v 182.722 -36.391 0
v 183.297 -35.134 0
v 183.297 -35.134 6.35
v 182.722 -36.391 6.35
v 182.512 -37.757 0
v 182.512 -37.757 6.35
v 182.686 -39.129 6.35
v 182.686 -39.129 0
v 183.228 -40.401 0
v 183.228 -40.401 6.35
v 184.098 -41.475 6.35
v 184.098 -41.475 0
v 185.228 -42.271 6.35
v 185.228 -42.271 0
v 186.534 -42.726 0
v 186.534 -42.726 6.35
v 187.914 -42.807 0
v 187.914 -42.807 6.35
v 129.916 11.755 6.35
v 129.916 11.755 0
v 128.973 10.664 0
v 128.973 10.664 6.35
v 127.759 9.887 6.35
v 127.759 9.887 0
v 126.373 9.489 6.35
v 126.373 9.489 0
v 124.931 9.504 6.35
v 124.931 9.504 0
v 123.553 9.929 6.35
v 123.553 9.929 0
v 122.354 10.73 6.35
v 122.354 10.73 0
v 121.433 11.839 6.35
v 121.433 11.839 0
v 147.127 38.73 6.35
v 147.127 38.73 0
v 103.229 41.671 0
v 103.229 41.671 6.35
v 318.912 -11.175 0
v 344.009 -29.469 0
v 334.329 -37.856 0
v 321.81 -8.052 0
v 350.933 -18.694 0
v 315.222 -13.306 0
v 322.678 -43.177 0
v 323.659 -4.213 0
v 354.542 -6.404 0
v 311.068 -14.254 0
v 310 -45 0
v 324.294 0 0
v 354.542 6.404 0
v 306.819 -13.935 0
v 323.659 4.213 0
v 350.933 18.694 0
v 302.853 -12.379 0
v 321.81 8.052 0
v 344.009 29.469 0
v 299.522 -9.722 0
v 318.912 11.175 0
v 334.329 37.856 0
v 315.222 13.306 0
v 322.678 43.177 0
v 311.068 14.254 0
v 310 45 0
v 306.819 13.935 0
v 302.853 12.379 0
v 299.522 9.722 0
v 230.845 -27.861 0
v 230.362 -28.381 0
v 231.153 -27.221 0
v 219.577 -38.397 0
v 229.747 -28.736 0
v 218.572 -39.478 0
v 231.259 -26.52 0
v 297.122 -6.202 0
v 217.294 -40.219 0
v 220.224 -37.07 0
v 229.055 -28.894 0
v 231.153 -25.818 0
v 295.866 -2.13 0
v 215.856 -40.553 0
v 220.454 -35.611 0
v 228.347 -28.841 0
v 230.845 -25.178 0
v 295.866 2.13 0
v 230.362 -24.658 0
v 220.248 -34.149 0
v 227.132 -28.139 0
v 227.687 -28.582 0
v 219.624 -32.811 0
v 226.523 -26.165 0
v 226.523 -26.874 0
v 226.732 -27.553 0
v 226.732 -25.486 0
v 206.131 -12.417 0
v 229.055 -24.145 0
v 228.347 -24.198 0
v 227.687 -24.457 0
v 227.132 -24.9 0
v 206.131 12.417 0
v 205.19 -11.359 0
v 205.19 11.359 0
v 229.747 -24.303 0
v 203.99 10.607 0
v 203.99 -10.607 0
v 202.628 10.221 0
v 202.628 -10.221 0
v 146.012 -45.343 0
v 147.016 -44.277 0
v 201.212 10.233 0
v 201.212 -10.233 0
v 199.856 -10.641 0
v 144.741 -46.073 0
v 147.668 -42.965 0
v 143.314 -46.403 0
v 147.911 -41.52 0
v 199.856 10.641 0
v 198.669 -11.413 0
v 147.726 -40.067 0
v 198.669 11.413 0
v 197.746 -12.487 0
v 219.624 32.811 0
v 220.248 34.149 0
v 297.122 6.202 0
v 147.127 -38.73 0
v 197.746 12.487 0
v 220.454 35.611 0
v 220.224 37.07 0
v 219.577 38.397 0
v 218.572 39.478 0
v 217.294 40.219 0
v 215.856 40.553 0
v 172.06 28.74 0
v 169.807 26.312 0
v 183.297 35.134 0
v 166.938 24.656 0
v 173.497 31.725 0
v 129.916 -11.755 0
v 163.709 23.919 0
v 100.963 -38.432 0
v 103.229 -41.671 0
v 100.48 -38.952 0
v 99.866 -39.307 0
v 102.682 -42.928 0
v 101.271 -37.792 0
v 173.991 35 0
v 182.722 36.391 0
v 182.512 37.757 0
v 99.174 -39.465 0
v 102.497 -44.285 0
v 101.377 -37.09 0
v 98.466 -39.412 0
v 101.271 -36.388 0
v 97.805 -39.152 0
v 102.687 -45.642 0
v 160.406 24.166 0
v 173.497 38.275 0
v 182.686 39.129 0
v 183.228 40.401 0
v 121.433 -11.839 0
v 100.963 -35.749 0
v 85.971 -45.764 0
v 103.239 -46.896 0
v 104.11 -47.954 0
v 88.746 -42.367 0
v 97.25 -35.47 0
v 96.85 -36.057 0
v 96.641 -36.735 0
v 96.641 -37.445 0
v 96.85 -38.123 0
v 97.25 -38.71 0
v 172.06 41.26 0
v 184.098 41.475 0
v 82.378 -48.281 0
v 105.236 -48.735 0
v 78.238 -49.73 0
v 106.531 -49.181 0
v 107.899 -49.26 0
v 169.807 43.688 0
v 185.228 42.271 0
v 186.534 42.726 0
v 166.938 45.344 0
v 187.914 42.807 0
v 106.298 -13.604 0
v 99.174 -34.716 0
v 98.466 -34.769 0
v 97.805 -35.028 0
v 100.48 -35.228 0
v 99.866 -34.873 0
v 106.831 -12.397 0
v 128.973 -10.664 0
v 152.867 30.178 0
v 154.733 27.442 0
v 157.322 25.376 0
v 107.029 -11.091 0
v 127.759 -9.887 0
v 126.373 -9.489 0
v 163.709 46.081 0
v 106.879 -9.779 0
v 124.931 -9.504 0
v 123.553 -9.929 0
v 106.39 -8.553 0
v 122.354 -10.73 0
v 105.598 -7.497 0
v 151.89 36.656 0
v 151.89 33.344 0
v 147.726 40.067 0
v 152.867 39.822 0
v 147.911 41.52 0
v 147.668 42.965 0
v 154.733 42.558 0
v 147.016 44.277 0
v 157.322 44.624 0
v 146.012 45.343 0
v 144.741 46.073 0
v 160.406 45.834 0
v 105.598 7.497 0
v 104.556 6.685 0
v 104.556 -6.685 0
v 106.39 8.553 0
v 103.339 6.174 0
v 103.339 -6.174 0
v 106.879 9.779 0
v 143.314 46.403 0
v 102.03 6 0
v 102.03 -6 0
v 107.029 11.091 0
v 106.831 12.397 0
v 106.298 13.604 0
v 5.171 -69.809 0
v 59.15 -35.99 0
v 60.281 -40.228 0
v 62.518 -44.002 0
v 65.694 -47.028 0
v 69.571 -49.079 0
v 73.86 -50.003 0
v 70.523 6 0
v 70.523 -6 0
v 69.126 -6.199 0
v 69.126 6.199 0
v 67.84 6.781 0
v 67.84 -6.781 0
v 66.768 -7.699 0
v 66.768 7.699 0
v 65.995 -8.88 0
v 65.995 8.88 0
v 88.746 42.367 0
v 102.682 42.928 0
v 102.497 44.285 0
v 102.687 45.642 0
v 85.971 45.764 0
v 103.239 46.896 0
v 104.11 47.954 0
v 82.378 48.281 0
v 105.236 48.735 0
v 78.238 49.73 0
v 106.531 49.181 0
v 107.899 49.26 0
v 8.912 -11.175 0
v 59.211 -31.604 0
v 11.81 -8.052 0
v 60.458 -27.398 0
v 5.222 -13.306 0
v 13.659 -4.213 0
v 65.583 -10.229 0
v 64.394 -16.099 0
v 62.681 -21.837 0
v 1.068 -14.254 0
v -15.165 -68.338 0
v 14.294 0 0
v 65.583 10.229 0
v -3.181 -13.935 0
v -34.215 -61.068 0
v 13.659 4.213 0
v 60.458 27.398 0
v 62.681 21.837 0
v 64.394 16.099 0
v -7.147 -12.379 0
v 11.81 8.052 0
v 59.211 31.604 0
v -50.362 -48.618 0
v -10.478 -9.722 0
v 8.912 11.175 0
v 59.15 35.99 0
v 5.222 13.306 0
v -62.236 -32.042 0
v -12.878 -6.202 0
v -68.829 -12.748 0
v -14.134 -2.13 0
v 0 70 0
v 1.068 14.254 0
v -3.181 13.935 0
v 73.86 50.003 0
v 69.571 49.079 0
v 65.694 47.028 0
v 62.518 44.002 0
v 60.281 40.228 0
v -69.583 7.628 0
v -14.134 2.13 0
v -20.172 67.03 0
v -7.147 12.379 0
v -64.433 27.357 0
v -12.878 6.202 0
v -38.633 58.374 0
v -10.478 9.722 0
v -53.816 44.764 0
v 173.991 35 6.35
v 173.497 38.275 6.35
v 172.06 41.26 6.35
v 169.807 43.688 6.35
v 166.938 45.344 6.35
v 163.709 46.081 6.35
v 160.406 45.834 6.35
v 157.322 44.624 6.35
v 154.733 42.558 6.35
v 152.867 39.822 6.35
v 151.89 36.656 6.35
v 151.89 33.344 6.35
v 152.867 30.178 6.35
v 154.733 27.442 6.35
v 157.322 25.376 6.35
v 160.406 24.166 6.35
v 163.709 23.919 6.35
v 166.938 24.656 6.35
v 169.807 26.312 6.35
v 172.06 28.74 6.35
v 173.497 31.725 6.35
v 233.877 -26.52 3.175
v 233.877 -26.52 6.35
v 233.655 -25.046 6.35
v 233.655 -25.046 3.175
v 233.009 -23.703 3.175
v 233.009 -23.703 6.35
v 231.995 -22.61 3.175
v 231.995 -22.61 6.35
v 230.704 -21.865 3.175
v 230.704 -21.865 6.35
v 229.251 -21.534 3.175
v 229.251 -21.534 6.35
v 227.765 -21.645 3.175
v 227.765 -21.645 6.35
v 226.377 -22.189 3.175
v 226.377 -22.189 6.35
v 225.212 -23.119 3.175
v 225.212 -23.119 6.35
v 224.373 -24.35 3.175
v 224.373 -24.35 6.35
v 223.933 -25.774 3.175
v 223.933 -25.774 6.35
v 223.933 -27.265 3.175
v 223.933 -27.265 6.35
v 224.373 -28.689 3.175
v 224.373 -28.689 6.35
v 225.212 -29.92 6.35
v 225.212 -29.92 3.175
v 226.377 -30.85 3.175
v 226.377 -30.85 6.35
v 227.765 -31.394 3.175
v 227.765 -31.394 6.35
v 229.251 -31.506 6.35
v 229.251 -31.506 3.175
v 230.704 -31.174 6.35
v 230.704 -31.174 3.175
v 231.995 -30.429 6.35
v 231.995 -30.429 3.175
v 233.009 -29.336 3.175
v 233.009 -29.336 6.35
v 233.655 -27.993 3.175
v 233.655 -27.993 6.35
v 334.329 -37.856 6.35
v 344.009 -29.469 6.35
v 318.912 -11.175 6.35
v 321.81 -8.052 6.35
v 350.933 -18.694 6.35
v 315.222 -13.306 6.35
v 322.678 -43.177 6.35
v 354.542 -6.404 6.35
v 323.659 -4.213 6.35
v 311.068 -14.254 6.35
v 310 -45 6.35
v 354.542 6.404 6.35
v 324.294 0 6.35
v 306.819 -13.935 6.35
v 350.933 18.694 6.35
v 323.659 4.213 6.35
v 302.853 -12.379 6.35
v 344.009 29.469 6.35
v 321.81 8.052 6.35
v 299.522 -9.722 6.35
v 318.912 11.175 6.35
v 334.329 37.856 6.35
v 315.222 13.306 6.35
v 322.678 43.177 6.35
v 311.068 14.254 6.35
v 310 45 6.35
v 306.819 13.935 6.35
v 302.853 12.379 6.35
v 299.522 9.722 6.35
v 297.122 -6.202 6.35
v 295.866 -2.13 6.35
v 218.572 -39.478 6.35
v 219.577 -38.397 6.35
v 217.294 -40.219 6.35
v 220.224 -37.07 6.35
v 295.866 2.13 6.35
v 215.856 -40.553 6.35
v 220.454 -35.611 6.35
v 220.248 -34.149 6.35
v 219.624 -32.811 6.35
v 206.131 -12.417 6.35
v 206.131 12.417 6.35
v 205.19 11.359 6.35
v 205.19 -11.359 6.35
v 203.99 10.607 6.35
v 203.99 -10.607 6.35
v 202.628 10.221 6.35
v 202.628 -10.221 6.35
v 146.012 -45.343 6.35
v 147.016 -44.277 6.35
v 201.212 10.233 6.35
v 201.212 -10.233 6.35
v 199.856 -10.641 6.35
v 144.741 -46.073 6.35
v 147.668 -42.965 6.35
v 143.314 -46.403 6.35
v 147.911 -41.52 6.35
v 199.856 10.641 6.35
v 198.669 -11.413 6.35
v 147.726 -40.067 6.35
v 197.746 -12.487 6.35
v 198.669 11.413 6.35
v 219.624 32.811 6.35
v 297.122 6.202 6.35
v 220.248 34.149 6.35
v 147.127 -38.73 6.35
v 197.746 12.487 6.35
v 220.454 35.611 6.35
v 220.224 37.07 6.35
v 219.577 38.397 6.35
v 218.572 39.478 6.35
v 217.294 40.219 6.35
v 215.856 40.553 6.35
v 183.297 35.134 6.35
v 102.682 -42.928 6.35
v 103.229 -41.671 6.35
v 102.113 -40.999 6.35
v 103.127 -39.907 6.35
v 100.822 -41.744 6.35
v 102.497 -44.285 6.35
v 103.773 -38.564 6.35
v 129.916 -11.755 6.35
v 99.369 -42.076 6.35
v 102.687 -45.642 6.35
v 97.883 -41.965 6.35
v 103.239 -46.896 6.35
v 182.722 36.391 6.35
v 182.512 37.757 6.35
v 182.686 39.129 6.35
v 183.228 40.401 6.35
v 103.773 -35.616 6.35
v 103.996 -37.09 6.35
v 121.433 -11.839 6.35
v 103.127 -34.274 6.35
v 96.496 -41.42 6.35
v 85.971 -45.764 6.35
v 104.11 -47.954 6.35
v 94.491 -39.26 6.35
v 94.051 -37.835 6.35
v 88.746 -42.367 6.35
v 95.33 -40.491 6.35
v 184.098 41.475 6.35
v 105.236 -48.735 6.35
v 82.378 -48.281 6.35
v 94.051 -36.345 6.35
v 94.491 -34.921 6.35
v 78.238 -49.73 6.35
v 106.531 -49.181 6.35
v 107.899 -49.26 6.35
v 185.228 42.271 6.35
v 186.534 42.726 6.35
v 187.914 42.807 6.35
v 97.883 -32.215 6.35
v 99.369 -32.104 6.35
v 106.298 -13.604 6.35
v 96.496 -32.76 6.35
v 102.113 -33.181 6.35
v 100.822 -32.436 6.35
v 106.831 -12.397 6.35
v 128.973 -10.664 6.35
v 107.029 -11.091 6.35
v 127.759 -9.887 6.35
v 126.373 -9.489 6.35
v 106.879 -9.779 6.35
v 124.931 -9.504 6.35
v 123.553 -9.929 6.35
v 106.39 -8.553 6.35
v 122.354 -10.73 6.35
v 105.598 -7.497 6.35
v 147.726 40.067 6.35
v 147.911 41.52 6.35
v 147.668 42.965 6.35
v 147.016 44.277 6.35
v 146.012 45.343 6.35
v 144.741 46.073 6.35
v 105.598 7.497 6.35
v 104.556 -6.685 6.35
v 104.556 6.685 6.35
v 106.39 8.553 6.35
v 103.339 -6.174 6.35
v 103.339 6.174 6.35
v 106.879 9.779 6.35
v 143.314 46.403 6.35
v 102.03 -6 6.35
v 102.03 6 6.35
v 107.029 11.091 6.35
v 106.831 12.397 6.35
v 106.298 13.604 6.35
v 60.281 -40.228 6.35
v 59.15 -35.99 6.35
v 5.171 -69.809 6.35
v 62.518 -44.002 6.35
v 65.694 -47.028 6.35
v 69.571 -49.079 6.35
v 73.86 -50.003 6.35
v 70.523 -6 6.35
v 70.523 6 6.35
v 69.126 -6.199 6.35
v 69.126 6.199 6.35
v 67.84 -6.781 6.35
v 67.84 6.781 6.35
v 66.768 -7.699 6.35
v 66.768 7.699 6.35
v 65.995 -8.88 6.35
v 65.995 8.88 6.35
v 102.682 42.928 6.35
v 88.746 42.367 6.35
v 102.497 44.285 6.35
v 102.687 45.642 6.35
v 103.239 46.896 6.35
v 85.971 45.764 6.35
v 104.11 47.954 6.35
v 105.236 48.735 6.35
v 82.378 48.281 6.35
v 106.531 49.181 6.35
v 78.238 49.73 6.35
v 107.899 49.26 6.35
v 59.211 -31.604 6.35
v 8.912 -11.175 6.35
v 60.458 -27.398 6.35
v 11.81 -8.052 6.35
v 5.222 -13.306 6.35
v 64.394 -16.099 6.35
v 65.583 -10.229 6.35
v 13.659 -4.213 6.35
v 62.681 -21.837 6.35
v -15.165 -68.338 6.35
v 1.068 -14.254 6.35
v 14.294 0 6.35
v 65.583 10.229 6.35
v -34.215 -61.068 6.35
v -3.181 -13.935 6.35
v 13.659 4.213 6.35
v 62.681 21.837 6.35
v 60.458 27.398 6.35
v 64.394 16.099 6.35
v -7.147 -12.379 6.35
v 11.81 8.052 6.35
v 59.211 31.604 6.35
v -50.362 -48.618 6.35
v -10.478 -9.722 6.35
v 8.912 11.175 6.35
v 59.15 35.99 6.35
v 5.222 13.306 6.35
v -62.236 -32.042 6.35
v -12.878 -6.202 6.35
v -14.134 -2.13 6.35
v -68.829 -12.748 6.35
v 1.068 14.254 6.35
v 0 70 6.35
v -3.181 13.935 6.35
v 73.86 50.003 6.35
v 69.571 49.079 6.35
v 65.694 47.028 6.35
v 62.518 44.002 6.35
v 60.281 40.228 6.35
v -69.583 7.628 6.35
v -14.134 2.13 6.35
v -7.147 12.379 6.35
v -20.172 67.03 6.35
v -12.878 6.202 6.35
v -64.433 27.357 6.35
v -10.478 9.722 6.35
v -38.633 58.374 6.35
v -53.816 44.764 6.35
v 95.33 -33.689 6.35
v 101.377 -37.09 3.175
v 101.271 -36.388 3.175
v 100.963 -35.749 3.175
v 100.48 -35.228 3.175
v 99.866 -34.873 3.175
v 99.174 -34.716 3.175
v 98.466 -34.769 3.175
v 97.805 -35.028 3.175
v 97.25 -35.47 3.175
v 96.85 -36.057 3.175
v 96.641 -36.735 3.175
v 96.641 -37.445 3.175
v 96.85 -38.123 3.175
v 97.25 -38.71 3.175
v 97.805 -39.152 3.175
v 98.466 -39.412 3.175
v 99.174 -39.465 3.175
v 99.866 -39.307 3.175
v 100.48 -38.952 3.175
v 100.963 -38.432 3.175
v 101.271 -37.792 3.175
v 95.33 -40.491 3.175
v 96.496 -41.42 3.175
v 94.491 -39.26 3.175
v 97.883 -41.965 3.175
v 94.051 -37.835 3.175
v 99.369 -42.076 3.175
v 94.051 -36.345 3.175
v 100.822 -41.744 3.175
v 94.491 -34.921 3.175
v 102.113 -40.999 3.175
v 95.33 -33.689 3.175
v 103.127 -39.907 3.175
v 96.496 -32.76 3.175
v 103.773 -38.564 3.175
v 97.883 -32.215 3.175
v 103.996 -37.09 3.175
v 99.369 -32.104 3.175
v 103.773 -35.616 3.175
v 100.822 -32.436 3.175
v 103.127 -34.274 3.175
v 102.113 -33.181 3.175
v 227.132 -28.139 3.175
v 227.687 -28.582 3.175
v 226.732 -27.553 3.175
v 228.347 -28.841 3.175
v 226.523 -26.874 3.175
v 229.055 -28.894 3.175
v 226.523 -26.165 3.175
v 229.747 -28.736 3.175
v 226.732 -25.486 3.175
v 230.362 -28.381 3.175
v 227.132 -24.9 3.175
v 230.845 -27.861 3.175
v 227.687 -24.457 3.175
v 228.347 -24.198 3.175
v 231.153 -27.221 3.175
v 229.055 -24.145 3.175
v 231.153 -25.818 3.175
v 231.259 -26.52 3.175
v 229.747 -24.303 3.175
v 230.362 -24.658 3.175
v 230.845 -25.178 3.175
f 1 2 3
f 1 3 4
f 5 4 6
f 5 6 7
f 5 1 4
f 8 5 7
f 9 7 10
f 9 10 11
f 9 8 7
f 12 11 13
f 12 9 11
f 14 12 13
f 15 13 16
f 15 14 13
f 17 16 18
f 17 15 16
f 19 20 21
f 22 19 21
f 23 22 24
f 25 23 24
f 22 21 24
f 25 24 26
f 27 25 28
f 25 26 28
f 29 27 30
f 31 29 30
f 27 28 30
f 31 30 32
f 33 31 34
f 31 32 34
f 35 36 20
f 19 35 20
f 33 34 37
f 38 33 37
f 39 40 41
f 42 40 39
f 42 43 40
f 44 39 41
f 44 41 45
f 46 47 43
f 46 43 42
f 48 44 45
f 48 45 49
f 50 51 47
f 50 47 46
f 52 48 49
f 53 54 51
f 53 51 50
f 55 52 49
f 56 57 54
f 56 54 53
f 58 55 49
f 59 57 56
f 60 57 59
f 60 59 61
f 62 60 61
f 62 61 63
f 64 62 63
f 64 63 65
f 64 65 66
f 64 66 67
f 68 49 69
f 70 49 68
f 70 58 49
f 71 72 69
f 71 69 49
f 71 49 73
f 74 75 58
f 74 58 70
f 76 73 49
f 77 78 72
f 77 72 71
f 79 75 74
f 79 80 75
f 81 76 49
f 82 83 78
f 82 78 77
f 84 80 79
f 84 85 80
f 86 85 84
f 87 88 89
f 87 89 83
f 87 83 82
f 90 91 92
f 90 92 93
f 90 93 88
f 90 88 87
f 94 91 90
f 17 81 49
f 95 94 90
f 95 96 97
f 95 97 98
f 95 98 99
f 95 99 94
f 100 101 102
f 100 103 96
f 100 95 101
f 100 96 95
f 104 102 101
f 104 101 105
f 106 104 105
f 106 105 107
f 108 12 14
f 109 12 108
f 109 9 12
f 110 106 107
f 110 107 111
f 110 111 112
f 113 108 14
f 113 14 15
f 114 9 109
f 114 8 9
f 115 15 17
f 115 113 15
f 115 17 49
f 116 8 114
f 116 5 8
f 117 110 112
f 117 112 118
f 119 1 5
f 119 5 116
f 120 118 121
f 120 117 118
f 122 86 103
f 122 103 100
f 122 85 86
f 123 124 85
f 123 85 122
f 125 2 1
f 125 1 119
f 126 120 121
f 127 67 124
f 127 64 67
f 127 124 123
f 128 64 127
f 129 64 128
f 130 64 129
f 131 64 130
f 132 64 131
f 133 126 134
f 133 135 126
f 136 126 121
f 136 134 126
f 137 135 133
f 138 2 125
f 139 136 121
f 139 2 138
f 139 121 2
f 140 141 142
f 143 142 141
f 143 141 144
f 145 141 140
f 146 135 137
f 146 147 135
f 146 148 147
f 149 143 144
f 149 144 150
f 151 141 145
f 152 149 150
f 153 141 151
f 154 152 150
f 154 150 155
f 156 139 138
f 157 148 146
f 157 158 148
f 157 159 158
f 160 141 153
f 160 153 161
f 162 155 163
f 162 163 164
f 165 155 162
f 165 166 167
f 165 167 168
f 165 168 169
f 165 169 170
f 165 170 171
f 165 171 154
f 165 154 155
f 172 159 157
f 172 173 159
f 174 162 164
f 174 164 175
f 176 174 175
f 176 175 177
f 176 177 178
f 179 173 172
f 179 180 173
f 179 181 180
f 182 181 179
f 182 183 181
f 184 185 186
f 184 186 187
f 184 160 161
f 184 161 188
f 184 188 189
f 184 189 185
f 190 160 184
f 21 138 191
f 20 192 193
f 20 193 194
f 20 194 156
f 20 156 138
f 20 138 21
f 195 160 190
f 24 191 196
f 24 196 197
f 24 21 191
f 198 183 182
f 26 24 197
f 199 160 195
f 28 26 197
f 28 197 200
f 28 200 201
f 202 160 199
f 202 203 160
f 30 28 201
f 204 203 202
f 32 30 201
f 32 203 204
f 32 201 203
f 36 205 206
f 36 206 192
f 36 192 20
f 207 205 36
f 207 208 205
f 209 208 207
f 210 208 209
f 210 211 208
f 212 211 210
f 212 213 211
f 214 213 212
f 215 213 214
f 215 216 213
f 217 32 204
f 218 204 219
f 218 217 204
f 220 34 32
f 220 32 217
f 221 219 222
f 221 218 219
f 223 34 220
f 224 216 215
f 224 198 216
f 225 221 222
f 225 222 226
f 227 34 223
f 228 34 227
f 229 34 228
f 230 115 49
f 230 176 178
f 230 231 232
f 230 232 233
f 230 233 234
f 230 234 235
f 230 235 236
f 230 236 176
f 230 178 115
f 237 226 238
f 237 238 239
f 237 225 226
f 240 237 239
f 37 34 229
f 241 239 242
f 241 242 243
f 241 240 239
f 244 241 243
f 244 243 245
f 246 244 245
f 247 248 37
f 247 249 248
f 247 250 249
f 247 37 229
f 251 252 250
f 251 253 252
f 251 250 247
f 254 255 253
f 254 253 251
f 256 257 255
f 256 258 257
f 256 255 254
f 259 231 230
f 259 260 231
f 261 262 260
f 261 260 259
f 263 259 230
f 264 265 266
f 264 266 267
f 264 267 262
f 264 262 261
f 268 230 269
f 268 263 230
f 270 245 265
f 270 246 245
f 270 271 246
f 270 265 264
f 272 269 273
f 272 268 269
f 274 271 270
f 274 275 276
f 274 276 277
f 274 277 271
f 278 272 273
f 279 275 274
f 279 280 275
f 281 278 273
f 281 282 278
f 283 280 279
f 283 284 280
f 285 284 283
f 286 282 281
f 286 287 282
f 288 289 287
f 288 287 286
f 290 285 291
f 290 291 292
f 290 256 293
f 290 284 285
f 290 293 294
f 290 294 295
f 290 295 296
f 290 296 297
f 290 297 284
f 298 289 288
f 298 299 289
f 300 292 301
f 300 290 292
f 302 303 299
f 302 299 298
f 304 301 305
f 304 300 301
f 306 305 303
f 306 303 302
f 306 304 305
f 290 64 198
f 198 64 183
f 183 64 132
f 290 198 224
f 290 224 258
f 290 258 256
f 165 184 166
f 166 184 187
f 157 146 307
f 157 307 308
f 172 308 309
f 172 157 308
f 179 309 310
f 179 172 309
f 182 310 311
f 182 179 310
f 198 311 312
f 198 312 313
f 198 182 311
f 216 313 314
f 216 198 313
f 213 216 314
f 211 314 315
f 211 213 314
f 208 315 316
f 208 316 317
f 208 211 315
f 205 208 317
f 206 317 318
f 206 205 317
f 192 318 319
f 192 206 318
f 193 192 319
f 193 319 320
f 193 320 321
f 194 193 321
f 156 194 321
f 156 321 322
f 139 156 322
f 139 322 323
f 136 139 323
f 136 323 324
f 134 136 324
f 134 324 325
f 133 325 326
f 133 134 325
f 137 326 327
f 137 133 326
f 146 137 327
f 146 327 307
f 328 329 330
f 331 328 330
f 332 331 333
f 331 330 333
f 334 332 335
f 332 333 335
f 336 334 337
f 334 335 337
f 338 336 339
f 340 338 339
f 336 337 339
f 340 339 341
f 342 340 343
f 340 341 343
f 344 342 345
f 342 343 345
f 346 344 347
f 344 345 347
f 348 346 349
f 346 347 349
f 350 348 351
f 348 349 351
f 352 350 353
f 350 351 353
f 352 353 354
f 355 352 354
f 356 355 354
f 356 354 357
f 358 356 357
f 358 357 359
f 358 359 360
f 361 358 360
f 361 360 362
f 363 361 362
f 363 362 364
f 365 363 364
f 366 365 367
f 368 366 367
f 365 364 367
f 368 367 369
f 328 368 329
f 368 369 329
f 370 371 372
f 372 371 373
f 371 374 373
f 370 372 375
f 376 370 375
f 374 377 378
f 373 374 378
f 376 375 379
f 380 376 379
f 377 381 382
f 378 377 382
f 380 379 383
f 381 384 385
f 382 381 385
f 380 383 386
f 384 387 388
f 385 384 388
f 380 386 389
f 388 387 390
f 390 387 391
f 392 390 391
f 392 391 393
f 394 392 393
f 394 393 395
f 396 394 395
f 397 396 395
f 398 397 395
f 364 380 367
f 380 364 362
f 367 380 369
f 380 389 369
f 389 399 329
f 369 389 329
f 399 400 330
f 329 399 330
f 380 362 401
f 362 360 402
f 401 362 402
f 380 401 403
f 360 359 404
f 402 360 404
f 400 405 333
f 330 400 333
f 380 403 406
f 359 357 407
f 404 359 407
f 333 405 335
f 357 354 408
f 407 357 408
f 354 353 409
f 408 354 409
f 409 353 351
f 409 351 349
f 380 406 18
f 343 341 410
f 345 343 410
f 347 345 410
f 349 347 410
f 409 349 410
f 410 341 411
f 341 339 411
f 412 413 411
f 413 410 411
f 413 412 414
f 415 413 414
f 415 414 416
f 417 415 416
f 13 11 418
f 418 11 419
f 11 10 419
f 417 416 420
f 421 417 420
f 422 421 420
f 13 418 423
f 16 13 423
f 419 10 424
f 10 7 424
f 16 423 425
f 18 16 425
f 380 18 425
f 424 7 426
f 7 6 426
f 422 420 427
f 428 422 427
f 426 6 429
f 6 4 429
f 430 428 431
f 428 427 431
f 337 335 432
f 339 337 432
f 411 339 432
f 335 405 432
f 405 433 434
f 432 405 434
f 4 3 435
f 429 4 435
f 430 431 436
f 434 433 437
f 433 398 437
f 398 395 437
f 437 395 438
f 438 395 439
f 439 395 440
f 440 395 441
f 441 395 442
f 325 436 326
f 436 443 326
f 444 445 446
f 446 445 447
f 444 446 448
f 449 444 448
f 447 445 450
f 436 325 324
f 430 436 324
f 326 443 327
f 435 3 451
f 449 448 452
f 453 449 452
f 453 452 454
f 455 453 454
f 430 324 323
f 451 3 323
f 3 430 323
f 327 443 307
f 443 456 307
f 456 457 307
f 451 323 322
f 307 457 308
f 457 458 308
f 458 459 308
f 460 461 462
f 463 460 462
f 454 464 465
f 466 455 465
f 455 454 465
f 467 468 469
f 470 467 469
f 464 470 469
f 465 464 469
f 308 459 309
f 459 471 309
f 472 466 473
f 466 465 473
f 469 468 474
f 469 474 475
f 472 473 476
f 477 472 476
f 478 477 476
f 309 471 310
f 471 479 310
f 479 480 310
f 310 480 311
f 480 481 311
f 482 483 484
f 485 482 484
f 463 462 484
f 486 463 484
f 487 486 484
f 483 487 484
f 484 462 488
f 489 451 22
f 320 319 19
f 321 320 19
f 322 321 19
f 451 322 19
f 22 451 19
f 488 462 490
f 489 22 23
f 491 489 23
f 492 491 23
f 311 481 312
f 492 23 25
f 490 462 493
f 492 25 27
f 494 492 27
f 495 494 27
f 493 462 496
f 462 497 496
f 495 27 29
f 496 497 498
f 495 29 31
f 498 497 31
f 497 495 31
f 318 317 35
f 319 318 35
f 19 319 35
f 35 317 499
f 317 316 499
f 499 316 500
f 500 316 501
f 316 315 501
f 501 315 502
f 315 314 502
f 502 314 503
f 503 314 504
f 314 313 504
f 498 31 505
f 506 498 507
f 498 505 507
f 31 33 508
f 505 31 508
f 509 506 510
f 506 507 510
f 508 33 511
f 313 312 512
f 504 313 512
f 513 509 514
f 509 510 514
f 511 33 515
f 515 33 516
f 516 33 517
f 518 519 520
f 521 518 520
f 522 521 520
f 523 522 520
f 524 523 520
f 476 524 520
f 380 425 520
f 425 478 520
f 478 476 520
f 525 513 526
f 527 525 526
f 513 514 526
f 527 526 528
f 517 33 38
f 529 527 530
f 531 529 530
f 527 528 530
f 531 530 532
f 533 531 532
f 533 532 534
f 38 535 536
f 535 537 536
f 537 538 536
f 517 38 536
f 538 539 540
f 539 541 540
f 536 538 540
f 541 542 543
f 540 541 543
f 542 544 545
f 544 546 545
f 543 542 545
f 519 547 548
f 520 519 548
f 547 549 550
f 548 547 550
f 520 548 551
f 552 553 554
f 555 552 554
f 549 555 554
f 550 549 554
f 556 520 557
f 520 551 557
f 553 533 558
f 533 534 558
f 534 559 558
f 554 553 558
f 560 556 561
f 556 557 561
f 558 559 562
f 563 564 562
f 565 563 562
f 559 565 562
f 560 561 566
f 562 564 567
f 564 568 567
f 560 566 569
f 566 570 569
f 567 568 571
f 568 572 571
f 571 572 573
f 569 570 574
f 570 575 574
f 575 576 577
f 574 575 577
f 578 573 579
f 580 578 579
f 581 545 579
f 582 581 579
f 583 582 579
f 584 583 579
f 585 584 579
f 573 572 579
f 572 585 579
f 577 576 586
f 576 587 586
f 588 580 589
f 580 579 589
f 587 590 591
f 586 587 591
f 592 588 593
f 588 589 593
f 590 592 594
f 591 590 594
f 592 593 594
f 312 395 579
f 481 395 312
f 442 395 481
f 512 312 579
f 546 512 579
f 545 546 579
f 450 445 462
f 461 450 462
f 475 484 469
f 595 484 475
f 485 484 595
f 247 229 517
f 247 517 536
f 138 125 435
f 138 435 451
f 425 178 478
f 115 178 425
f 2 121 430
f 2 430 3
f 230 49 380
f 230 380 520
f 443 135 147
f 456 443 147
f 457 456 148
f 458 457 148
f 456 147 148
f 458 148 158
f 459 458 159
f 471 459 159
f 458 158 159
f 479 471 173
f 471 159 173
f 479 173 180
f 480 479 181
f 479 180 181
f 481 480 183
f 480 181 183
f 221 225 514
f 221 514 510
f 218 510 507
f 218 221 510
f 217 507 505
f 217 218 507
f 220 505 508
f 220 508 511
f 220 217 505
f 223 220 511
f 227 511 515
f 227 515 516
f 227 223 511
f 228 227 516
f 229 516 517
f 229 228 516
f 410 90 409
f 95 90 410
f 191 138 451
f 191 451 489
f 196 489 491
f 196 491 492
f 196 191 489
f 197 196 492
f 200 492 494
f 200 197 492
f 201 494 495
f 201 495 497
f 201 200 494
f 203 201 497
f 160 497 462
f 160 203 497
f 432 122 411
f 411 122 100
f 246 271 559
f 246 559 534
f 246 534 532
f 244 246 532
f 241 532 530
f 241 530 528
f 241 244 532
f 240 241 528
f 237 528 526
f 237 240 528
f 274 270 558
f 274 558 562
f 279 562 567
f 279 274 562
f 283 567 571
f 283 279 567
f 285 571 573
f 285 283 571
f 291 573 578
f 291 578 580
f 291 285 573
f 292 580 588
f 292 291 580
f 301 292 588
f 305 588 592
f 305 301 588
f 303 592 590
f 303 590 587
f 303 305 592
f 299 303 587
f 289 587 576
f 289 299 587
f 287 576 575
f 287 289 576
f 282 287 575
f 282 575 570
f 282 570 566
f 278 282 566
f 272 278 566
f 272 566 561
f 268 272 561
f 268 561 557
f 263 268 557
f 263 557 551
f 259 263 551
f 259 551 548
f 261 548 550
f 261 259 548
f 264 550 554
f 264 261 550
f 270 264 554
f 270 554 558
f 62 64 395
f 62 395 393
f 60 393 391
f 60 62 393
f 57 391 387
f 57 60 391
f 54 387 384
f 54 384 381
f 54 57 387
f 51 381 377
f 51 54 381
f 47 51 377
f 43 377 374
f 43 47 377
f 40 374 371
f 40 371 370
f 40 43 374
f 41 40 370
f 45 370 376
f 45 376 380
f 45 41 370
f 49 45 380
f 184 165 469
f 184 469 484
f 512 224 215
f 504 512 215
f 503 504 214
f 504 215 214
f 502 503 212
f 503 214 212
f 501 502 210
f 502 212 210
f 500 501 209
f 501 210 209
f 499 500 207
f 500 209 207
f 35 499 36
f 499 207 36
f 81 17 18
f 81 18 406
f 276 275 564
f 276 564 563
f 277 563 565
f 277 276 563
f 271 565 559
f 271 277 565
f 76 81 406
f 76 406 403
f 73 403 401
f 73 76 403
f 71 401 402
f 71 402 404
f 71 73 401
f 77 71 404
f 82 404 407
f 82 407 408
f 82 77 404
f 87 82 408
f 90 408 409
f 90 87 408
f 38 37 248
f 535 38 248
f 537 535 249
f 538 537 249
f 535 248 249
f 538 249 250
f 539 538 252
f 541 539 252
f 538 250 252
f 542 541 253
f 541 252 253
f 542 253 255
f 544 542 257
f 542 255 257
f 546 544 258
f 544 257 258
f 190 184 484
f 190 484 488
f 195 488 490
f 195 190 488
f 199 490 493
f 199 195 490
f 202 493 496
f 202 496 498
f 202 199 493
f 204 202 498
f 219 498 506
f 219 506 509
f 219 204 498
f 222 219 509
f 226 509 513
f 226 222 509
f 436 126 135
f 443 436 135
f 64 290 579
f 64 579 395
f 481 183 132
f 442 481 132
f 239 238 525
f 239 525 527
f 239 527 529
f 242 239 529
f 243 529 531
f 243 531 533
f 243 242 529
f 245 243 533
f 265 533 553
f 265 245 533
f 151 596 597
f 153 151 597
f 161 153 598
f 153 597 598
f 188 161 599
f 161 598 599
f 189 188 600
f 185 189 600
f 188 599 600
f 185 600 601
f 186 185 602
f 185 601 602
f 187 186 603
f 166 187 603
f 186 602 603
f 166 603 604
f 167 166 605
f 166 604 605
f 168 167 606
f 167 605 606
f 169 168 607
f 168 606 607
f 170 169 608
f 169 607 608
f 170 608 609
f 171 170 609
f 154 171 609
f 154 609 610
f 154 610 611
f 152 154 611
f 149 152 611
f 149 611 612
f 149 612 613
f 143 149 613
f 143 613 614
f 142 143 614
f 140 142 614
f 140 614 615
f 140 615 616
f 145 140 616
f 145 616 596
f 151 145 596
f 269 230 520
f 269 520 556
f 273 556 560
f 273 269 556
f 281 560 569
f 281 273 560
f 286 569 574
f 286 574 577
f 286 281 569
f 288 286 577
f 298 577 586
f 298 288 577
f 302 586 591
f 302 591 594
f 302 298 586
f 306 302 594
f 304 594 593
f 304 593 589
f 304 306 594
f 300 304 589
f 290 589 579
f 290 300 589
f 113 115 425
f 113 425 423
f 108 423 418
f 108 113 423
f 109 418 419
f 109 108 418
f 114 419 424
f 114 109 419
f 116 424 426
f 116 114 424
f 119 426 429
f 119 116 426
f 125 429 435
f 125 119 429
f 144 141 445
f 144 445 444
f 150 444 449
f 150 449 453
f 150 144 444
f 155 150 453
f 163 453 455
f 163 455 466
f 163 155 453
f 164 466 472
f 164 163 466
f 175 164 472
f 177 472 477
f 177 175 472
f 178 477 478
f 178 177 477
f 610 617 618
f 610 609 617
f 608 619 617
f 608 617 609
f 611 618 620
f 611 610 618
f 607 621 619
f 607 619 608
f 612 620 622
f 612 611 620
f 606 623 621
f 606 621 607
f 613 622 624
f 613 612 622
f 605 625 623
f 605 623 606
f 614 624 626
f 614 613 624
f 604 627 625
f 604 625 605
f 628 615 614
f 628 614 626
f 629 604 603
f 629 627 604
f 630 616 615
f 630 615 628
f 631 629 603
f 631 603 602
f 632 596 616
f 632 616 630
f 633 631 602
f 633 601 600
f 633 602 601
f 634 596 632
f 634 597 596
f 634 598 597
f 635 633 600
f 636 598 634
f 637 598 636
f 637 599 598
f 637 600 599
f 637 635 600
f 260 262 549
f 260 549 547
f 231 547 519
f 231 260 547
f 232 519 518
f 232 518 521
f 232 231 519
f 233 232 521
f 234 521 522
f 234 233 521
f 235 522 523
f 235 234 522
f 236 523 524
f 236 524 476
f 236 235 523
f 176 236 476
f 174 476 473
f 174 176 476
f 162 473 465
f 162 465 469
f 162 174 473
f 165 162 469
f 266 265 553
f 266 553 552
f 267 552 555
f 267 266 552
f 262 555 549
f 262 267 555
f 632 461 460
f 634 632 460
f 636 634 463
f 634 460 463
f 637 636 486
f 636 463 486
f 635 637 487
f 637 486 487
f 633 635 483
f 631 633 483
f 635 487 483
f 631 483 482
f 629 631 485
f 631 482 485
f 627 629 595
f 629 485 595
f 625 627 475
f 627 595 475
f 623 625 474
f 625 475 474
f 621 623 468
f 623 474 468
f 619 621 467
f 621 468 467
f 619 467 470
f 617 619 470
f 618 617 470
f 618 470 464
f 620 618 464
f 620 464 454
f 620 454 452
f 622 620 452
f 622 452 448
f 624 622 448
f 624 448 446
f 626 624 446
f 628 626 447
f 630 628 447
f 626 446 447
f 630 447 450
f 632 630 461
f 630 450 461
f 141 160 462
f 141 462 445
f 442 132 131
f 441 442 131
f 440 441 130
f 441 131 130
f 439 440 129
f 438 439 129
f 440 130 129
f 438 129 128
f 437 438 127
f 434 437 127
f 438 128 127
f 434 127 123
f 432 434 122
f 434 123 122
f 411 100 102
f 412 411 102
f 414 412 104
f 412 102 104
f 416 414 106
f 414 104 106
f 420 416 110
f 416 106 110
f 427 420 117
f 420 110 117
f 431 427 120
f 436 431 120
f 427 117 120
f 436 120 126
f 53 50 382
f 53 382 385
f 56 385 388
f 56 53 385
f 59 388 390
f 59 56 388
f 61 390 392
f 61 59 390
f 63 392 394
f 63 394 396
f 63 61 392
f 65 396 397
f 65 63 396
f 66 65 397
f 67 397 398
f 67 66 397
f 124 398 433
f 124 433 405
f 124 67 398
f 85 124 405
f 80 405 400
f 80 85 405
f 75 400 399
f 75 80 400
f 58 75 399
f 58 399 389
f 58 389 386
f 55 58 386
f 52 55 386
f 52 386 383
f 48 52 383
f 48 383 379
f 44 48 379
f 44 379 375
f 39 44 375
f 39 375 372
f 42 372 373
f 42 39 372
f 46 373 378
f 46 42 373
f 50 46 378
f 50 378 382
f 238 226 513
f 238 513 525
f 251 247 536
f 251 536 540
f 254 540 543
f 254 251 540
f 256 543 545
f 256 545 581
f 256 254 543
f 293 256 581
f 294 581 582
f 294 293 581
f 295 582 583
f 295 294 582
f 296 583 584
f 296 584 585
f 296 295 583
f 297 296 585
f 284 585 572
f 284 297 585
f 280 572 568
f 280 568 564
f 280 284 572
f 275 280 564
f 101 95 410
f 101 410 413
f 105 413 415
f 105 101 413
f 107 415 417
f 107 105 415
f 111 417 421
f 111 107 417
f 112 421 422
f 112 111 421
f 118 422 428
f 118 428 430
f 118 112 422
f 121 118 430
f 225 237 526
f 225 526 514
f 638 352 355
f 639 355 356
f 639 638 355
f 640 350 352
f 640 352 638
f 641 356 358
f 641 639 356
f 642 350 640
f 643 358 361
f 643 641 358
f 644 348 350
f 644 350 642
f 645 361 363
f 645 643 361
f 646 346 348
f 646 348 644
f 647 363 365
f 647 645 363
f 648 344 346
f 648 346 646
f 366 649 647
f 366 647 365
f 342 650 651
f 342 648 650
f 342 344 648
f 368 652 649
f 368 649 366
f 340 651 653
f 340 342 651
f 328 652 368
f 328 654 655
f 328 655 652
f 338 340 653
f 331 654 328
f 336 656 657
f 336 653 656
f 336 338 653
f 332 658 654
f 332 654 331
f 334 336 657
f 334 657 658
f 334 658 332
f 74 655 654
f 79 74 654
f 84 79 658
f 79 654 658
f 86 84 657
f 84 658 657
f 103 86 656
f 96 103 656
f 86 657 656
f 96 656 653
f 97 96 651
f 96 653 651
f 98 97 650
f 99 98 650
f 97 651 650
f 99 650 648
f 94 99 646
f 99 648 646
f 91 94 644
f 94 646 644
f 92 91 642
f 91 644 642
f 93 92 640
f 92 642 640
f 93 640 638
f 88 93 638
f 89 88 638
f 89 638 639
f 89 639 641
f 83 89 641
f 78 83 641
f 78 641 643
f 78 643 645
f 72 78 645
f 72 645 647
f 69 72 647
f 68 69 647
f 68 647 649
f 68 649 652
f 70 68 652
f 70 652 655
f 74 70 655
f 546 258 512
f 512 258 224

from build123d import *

# Parameters (mm, degrees)
SKETCH1_R             = 14.29385
SKETCH1_R_2           = 11.1125
BOSS_EXTRUDE1_DEPTH   = 6.35
CROQUIS1_R            = 2.38125
CORTAR_EXTRUIR1_DEPTH = 50
CROQUIS2_R            = 5
CORTAR_EXTRUIR2_DEPTH = 3.175


with BuildPart() as part:
    # Sketch1 → Boss-Extrude1 (new body)
    with BuildSketch(Plane.XY):
        with BuildLine():
            Line((0, 70), (310, 45))
            ThreePointArc((310, 45), (355, 0), (310, -45))
            Line((310, -45), (5.171398252, -69.808714643))
            ThreePointArc((5.171398252, -69.808714643), (-69.952162315, -2.587467389), (0, 70))
        make_face()
        Circle(SKETCH1_R, mode=Mode.SUBTRACT)
        with Locations((310, 0)):
            Circle(SKETCH1_R, mode=Mode.SUBTRACT)
        with Locations((162.878542763, 35)):
            Circle(SKETCH1_R_2, mode=Mode.SUBTRACT)
        with BuildLine():
            Line((107.898974887, 49.259511156), (143.314248041, 46.40344074))
            ThreePointArc((143.314248041, 46.40344074), (147.389908855, 43.644764005), (147.127454118, 38.730252238))
            Line((147.127454118, 38.730252238), (129.916226305, 11.754586611))
            ThreePointArc((129.916226305, 11.754586611), (125.651076231, 9.444205574), (121.433006579, 11.839462159))
            Line((121.433006579, 11.839462159), (103.228961238, 41.671198203))
            ThreePointArc((103.228961238, 41.671198203), (103.238833139, 46.896293531), (107.898974887, 49.259511156))
        make_face(mode=Mode.SUBTRACT)
        with BuildLine():
            Line((70.523244027, 6), (102.03004784, 6))
            ThreePointArc((102.03004784, 6), (106.3902351, 8.552804247), (106.298140539, 13.604493178))
            Line((106.298140539, 13.604493178), (88.746497295, 42.367110417))
            ThreePointArc((88.746497295, 42.367110417), (67.562092561, 48.186702797), (60.457600585, 27.397935321))
            ThreePointArc((60.457600585, 27.397935321), (63.602250375, 18.987418874), (65.58297828, 10.229432452))
            ThreePointArc((65.58297828, 10.229432452), (67.271539685, 7.201787411), (70.523244027, 6))
        make_face(mode=Mode.SUBTRACT)
        with BuildLine():
            Line((219.623774494, 32.810522613), (206.130928429, 12.417497436))
            ThreePointArc((206.130928429, 12.417497436), (201.919524559, 10.176643248), (197.745901529, 12.48710226))
            Line((197.745901529, 12.48710226), (183.296864227, 35.133505128))
            ThreePointArc((183.296864227, 35.133505128), (183.227765467, 40.400743015), (187.913912204, 42.80669363))
            Line((187.913912204, 42.80669363), (215.855795571, 40.553315939))
            ThreePointArc((215.855795571, 40.553315939), (219.949772588, 37.757395035), (219.623774494, 32.810522613))
        make_face(mode=Mode.SUBTRACT)
        with BuildLine():
            Line((88.746497295, -42.367110417), (106.298140539, -13.604493178))
            ThreePointArc((106.298140539, -13.604493178), (106.3902351, -8.552804247), (102.03004784, -6))
            Line((102.03004784, -6), (70.523244027, -6))
            ThreePointArc((70.523244027, -6), (67.271539685, -7.201787411), (65.58297828, -10.229432452))
            ThreePointArc((65.58297828, -10.229432452), (63.602250375, -18.987418874), (60.457600585, -27.397935321))
            ThreePointArc((60.457600585, -27.397935321), (67.562092561, -48.186702797), (88.746497295, -42.367110417))
        make_face(mode=Mode.SUBTRACT)
        with BuildLine():
            Line((187.913912204, -42.80669363), (215.855795571, -40.553315939))
            ThreePointArc((215.855795571, -40.553315939), (219.949772588, -37.757395035), (219.623774494, -32.810522613))
            Line((219.623774494, -32.810522613), (206.130928429, -12.417497436))
            ThreePointArc((206.130928429, -12.417497436), (201.919524559, -10.176643248), (197.745901529, -12.48710226))
            Line((197.745901529, -12.48710226), (183.296864227, -35.133505128))
            ThreePointArc((183.296864227, -35.133505128), (183.227765467, -40.400743015), (187.913912204, -42.80669363))
        make_face(mode=Mode.SUBTRACT)
        with BuildLine():
            Line((121.433006579, -11.839462159), (103.228961238, -41.671198203))
            ThreePointArc((103.228961238, -41.671198203), (103.238833139, -46.896293531), (107.898974887, -49.259511156))
            Line((107.898974887, -49.259511156), (143.314248041, -46.40344074))
            ThreePointArc((143.314248041, -46.40344074), (147.389908855, -43.644764005), (147.127454118, -38.730252238))
            Line((147.127454118, -38.730252238), (129.916226305, -11.754586611))
            ThreePointArc((129.916226305, -11.754586611), (125.651076231, -9.444205574), (121.433006579, -11.839462159))
        make_face(mode=Mode.SUBTRACT)
    extrude(amount=BOSS_EXTRUDE1_DEPTH)

    # Croquis1 → Cortar-Extruir1 (cut)
    with BuildSketch(Plane.XY.offset(6.35)):
        with Locations((98.995555235, -37.090103176)):
            Circle(CROQUIS1_R)
        with Locations((228.877351461, -26.519571404)):
            Circle(CROQUIS1_R)
    extrude(amount=-CORTAR_EXTRUIR1_DEPTH, mode=Mode.SUBTRACT)

    # Croquis2 → Cortar-Extruir2 (cut)
    with BuildSketch(Plane.XY.offset(6.35)):
        with Locations((98.995555235, -37.090103176)):
            Circle(CROQUIS2_R)
        with Locations((228.877351461, -26.519571404)):
            Circle(CROQUIS2_R)
    extrude(amount=-CORTAR_EXTRUIR2_DEPTH, mode=Mode.SUBTRACT)


solid = part.part
